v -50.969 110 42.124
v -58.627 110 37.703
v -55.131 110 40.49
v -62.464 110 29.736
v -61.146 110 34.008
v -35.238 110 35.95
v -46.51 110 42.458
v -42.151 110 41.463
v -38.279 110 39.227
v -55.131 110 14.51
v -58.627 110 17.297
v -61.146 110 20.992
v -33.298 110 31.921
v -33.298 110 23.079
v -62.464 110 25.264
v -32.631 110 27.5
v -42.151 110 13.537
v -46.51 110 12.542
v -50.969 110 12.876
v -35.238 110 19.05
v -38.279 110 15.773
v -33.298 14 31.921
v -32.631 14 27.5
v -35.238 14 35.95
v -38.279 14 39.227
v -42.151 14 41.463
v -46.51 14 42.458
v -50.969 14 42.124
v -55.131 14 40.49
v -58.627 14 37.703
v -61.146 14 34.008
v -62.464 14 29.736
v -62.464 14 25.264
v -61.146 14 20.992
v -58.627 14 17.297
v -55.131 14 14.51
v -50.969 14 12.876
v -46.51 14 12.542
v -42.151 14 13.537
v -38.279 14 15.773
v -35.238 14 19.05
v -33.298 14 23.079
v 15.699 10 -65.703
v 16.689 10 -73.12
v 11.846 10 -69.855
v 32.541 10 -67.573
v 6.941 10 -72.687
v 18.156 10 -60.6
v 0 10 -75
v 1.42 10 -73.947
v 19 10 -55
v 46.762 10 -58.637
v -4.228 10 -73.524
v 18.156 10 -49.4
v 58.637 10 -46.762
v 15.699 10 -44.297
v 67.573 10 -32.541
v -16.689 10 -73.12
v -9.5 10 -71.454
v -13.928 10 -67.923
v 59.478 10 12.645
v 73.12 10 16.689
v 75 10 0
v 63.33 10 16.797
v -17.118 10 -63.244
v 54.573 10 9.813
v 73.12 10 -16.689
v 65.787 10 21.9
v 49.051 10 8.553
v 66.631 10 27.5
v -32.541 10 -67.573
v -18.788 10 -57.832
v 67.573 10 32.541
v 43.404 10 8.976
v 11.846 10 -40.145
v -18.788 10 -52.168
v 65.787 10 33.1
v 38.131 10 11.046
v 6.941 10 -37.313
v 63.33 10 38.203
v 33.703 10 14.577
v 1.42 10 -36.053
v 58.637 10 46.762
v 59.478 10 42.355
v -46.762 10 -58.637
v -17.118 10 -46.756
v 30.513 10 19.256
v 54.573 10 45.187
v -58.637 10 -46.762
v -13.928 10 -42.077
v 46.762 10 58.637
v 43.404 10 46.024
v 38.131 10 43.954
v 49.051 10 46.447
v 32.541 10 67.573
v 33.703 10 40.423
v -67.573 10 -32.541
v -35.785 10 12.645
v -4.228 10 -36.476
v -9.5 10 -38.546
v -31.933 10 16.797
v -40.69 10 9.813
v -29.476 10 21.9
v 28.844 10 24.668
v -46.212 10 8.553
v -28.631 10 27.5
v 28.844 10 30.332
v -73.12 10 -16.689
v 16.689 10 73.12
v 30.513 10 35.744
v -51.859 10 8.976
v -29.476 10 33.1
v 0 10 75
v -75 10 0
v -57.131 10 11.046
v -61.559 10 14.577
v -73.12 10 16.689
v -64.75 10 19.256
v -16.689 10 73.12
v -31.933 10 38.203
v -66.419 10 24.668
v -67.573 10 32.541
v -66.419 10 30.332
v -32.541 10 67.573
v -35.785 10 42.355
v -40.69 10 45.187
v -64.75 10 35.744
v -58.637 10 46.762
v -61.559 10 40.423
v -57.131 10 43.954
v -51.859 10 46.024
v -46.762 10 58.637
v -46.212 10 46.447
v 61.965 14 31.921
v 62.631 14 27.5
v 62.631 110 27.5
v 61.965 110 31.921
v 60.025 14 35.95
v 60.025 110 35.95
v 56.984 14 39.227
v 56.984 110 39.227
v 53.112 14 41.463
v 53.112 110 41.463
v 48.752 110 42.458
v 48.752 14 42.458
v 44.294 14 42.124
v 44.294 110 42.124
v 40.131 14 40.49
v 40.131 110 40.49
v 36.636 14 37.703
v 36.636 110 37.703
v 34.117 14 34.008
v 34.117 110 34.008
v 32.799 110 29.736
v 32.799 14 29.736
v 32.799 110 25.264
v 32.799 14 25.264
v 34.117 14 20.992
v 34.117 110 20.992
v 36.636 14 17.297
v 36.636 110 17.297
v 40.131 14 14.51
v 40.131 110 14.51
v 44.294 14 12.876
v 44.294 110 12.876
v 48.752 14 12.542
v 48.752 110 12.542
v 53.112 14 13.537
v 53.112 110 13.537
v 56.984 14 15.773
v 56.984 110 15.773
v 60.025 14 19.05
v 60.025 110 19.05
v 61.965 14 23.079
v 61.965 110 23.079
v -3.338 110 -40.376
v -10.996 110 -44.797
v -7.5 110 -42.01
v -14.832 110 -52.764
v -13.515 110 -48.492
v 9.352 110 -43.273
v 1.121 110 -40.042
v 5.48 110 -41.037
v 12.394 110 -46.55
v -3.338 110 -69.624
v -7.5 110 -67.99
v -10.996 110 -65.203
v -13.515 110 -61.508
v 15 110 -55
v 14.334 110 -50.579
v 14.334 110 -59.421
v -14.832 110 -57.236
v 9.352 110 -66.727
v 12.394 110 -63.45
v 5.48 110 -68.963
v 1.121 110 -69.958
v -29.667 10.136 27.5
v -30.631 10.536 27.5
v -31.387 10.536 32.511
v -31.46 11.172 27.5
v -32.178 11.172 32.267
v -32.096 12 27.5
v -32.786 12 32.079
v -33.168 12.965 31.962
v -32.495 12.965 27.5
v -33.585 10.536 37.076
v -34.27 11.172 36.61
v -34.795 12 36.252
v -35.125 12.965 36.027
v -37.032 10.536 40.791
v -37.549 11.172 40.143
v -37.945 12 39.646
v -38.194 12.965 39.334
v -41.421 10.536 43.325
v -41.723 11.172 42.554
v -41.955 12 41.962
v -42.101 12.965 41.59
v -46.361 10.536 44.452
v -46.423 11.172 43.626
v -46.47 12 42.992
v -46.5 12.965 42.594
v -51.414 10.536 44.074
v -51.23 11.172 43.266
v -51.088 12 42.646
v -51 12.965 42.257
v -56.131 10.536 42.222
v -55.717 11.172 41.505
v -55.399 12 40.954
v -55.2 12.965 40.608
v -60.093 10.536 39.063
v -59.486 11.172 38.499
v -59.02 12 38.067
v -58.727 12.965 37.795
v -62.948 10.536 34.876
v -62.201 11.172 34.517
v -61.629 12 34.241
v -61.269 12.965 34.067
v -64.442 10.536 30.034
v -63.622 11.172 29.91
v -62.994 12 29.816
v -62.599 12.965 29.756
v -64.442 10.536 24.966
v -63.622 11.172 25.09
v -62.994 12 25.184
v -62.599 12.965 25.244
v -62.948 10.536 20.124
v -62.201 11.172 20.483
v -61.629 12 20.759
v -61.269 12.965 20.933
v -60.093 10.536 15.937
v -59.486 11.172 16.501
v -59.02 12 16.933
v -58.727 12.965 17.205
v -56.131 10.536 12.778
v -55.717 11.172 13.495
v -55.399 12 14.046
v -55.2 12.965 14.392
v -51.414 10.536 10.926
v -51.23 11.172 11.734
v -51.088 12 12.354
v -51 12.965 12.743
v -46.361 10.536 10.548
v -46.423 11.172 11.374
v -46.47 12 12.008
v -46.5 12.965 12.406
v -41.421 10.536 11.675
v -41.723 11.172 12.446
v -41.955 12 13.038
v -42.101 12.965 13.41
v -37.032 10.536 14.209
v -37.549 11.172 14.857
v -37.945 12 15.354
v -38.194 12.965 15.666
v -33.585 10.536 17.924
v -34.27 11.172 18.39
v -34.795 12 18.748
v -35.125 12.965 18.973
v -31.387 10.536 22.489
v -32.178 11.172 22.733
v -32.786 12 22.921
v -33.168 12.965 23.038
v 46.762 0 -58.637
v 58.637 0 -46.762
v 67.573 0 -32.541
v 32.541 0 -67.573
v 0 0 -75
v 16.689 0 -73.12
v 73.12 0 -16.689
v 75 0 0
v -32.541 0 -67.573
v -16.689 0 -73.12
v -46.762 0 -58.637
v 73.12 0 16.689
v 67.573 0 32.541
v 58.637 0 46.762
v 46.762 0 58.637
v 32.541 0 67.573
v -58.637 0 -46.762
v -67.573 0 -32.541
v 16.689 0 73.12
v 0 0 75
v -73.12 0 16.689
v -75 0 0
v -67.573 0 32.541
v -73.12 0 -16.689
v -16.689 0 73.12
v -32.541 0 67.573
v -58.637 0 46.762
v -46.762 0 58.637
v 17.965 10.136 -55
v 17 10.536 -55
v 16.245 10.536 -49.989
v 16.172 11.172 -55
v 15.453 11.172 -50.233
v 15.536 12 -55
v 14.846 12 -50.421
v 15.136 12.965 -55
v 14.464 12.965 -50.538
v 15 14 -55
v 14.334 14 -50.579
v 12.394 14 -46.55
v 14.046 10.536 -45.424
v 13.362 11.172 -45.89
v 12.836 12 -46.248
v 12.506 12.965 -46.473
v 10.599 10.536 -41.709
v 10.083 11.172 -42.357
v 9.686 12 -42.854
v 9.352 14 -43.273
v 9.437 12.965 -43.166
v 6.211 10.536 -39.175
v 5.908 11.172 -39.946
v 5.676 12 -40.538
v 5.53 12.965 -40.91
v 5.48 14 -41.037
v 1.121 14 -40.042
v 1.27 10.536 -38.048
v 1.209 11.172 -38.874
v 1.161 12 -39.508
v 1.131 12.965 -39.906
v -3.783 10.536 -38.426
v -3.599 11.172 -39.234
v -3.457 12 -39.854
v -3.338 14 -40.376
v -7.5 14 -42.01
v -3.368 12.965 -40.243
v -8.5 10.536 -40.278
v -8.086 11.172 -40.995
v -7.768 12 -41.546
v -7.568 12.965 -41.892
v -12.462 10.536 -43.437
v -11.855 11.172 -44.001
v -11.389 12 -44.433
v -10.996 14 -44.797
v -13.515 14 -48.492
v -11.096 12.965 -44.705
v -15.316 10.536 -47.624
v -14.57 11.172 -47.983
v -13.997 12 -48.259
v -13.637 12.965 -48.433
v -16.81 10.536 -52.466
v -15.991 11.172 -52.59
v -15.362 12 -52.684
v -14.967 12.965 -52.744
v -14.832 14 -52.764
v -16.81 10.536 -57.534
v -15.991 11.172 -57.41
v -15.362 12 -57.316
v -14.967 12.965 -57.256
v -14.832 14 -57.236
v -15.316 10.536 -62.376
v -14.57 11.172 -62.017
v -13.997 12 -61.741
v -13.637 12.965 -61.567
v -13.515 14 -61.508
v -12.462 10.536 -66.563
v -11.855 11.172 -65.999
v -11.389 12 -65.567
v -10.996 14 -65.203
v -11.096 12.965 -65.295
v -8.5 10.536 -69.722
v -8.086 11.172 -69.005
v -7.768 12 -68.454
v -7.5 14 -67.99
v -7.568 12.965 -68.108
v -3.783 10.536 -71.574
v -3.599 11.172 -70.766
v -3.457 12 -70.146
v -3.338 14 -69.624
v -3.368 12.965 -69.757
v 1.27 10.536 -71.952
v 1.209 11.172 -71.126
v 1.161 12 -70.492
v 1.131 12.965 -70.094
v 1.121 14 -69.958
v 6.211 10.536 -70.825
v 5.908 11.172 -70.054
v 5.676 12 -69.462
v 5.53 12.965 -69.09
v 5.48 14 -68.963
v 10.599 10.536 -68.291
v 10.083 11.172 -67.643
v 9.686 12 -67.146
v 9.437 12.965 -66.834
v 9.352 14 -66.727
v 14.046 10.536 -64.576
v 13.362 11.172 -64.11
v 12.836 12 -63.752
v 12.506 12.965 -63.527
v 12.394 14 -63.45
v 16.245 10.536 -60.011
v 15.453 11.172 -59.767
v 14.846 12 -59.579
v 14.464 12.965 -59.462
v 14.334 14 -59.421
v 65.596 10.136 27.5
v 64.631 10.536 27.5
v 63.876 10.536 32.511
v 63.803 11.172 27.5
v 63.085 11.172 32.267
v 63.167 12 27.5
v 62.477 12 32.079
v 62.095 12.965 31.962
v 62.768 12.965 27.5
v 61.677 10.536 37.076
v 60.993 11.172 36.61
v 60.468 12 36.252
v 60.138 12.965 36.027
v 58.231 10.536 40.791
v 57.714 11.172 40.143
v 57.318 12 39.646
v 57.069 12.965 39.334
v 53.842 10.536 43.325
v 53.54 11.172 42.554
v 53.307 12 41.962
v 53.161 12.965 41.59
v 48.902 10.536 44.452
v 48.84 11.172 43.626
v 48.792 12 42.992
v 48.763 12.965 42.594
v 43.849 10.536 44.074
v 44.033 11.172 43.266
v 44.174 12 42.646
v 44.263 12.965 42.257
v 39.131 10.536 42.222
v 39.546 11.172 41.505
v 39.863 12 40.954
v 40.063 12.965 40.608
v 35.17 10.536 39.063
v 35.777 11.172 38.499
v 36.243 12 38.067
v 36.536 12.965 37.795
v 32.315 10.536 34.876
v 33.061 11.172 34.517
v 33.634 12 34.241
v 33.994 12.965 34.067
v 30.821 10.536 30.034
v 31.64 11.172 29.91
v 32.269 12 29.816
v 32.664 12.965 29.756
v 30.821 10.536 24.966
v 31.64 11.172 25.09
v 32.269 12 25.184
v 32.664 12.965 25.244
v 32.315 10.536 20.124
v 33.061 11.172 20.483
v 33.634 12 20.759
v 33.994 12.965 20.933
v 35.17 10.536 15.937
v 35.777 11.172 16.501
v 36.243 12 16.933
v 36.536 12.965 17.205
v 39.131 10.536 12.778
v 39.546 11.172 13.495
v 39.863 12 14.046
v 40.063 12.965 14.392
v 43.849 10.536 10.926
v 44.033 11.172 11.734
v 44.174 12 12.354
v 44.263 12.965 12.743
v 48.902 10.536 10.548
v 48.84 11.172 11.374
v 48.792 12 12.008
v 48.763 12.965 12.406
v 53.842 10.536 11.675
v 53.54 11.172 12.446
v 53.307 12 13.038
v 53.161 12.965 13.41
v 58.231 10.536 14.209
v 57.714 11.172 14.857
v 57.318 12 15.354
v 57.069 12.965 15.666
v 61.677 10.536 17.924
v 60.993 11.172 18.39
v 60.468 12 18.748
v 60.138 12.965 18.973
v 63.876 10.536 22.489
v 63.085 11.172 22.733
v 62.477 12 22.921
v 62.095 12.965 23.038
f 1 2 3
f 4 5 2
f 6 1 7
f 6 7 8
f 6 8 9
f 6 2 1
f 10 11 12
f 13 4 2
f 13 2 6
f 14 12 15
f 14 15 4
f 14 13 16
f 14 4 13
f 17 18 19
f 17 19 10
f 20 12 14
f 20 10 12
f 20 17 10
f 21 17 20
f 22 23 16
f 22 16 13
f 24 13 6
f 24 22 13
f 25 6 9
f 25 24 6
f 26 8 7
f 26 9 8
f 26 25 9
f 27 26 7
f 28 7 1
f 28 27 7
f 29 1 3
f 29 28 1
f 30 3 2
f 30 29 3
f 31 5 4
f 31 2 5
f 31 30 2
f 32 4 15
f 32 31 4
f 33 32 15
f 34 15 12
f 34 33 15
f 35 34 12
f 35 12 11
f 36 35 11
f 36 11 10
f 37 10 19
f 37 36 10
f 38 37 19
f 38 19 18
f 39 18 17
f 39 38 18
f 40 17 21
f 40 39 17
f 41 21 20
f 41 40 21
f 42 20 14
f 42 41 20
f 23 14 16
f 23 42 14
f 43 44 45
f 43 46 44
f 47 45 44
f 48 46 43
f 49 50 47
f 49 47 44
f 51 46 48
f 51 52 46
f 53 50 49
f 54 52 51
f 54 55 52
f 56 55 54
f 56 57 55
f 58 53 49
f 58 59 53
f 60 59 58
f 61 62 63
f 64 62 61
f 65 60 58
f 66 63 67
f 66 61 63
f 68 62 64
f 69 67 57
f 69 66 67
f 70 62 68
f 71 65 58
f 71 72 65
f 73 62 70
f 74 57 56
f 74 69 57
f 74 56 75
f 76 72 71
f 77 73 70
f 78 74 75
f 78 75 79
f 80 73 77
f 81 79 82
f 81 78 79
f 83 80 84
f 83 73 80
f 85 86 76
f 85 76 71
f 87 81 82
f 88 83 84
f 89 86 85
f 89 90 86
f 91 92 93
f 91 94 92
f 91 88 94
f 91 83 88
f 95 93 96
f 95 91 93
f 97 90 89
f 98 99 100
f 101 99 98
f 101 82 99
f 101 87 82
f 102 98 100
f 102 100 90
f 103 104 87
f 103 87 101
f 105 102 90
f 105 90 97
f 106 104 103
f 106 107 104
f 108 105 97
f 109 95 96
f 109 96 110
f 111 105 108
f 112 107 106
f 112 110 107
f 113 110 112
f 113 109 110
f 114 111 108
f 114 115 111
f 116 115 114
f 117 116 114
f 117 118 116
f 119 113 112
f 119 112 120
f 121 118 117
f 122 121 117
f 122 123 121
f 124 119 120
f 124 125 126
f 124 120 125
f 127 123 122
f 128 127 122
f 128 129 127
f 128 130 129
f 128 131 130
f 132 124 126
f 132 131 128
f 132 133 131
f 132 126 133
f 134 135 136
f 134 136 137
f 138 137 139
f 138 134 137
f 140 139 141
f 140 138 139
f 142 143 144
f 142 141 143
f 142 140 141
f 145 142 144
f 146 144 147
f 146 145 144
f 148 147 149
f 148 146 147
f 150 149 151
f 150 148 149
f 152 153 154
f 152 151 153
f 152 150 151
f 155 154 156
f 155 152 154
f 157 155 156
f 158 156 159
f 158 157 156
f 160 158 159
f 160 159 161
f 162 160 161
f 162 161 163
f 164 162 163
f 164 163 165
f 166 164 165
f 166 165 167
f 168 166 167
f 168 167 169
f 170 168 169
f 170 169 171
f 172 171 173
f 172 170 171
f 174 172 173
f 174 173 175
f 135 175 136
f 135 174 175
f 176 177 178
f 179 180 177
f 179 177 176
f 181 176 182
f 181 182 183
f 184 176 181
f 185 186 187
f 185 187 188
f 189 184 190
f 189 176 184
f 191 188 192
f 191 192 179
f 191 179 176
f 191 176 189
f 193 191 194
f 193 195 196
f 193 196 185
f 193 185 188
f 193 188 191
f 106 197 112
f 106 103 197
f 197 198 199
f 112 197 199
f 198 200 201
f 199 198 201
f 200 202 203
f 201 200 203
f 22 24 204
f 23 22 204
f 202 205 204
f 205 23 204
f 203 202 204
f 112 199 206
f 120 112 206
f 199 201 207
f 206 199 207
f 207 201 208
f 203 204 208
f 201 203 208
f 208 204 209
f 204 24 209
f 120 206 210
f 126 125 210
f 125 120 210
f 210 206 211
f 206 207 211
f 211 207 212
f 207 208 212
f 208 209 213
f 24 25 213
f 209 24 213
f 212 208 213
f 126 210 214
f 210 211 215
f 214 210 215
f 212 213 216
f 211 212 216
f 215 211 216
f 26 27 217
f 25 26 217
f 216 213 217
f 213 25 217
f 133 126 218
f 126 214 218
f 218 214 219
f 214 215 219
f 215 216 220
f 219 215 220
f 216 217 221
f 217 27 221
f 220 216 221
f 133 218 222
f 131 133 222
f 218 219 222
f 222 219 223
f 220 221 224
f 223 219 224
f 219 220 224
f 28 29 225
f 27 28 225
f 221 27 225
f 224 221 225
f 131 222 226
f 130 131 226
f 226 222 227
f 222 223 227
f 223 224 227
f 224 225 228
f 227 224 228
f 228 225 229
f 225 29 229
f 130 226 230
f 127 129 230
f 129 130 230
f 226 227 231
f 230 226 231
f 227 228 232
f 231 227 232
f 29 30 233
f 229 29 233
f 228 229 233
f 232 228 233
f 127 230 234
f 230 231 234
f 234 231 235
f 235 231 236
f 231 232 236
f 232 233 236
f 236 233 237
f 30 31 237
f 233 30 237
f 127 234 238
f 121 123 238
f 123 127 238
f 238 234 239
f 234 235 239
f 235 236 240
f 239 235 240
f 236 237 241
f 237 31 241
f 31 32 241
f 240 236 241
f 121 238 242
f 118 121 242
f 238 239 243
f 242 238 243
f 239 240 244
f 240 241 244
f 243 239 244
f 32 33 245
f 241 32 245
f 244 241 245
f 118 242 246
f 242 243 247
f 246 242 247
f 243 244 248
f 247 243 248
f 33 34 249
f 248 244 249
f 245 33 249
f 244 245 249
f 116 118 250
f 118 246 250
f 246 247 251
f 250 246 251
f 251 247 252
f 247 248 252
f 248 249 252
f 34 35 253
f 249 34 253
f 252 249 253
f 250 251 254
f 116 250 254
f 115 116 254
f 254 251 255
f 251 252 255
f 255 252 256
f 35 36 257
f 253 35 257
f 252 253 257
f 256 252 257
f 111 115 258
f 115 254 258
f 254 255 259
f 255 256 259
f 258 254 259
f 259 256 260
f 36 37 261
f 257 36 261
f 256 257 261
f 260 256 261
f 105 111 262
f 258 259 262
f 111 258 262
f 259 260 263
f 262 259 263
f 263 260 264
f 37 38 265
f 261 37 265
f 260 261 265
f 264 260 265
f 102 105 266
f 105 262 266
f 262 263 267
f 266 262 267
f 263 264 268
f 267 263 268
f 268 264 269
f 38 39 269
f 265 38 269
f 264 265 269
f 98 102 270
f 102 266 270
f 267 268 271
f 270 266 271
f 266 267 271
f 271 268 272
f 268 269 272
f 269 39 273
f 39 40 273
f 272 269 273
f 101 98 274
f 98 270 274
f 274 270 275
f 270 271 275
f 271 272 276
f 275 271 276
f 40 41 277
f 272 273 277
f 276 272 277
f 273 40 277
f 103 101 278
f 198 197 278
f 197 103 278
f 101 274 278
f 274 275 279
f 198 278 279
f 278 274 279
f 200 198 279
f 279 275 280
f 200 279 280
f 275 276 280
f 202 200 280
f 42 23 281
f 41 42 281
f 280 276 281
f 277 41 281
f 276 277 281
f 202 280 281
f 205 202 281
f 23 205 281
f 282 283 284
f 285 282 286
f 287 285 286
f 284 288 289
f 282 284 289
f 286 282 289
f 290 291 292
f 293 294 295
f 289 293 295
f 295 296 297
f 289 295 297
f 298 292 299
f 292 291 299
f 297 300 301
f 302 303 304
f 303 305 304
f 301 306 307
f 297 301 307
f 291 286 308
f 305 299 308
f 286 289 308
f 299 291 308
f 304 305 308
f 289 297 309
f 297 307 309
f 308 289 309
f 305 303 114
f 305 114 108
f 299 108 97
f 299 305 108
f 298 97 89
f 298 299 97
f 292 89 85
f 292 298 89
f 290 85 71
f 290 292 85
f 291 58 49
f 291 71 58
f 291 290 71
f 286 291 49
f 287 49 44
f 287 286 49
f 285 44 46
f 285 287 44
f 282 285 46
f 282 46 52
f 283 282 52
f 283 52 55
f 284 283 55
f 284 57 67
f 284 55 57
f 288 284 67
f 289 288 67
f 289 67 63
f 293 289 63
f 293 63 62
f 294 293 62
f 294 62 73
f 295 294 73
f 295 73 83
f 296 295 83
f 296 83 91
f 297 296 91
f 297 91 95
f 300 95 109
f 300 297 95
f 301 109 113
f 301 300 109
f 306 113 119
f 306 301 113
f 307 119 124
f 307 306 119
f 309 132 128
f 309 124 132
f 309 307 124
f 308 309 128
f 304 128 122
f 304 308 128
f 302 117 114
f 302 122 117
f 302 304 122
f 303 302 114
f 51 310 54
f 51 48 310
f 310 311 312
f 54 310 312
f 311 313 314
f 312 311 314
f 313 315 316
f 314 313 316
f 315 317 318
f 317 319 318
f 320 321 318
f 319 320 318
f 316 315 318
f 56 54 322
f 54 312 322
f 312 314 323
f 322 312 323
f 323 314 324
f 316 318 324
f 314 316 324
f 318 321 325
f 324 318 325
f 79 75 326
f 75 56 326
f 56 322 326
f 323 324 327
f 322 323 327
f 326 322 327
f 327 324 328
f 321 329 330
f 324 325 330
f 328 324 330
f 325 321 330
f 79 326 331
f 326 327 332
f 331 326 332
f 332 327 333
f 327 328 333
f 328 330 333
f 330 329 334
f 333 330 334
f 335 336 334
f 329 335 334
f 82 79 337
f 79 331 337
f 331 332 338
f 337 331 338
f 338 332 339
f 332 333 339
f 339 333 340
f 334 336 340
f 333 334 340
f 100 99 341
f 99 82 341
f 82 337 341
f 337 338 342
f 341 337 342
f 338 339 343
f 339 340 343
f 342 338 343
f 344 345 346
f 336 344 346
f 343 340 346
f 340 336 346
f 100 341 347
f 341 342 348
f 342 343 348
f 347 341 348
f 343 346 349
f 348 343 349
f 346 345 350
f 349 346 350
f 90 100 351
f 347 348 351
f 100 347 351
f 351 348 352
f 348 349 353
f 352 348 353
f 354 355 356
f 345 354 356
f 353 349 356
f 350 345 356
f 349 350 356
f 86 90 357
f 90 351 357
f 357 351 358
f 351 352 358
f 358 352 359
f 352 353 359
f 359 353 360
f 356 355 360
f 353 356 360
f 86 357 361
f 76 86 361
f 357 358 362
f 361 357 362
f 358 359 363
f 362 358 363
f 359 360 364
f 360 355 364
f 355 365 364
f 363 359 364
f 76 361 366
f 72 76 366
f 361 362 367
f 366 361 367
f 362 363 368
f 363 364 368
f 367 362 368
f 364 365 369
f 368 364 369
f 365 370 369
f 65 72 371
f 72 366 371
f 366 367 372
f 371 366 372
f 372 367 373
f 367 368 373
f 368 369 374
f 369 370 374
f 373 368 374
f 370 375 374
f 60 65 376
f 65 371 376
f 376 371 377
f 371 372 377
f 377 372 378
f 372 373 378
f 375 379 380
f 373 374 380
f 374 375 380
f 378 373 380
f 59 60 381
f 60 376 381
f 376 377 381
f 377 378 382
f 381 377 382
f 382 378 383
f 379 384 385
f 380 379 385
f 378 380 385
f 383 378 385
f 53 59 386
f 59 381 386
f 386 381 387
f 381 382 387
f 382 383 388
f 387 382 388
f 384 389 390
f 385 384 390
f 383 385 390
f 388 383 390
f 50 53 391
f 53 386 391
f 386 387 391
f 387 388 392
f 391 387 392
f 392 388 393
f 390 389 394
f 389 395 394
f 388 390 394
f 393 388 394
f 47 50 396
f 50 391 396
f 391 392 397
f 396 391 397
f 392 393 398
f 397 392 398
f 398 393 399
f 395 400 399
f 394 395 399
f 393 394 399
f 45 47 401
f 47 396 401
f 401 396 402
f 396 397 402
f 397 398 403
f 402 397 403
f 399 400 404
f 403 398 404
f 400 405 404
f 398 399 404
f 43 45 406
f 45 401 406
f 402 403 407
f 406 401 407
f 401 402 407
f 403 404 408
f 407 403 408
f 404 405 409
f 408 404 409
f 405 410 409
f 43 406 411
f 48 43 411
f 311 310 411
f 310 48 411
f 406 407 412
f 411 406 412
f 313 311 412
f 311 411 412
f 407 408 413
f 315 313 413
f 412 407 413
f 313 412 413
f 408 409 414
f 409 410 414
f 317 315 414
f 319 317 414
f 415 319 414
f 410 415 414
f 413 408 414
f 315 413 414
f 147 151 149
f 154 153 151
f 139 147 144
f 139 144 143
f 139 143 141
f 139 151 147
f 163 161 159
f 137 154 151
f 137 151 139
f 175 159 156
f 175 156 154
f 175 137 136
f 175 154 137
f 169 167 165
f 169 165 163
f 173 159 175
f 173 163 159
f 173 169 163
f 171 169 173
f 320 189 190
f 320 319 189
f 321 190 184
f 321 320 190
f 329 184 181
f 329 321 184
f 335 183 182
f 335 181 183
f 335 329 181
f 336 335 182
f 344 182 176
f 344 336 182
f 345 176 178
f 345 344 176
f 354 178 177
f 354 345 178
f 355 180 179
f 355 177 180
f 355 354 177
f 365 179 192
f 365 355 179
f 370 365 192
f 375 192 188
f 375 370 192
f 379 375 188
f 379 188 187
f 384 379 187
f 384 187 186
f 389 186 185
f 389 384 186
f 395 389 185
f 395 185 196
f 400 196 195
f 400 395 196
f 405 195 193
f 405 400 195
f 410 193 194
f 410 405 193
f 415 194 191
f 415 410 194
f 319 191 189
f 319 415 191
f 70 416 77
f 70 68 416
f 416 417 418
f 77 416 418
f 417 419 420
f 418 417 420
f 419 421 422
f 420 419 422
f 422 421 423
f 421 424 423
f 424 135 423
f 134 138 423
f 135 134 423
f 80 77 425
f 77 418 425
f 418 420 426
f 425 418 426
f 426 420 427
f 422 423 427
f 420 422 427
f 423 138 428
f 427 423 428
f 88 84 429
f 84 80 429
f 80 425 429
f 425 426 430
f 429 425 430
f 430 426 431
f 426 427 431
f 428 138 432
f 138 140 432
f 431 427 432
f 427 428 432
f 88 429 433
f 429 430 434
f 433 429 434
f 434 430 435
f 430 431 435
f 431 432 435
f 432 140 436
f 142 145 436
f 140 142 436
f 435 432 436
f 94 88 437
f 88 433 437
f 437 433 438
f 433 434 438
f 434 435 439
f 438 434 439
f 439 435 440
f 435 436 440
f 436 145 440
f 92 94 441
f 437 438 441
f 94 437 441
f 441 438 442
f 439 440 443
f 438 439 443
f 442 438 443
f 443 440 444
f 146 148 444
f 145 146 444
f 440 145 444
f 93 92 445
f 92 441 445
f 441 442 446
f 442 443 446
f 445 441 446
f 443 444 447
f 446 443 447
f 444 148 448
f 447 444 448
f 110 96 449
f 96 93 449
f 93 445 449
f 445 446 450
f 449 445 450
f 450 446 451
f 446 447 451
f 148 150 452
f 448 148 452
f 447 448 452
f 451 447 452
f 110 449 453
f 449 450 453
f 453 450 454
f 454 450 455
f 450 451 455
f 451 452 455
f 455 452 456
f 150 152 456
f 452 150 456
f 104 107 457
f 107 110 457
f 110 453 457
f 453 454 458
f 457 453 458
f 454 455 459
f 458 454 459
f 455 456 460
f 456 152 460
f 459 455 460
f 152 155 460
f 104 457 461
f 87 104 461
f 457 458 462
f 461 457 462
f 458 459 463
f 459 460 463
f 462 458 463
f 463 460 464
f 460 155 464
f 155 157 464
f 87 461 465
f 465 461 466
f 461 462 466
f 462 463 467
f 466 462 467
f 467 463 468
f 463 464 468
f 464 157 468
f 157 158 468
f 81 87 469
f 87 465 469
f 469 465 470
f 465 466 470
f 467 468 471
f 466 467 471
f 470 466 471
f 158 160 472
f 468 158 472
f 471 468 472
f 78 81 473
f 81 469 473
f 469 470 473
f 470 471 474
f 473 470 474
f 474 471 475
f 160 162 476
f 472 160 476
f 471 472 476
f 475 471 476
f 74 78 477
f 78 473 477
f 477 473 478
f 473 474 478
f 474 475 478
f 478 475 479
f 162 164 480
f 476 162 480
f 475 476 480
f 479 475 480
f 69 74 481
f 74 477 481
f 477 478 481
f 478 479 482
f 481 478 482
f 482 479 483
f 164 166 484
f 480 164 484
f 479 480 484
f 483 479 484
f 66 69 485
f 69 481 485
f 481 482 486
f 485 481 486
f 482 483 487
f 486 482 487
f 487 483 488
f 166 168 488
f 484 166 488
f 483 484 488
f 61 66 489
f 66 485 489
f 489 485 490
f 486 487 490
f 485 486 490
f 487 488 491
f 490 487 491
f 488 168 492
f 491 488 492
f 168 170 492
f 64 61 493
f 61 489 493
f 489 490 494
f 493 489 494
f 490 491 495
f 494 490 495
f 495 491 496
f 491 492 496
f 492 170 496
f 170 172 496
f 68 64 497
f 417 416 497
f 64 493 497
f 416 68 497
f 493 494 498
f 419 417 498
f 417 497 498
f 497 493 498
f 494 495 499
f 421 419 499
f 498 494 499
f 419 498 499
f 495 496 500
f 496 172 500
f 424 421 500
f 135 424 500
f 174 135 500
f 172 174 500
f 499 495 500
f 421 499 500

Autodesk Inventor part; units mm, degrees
ref_plane "YZ Plane" through (0, 0, 0) normal (1, 0, 0) x (0, 1, 0)
ref_plane "XZ Plane" through (0, 0, 0) normal (0, 1, 0) x (-1, 0, 0)
ref_plane "XY Plane" through (0, 0, 0) normal (0, 0, 1) x (1, 0, 0)
sketch "スケッチ1" plane through (0, 0, 0) normal (0, 1, 0) x (-1, 0, 0)
  circle A0 centre (0, 0) radius 75
  dimension "d0" = 150
extrude "押し出し1" add sketch "スケッチ1" along normal blind 10
sketch "スケッチ2" plane through (0, 10, 0) normal (0, 1, 0) x (1, 0, 0)
  circle A0 centre (0, 55) radius 15
  circle A1 centre (-47.6314, -27.5) radius 15
  circle A2 centre (47.6314, -27.5) radius 15
  point P0 (0, 0)
  dimension "d3" = 30
  dimension "d4" = 55
  dimension "d7" = 360
extrude "押し出し2" add sketch "スケッチ2" along normal blind 100
fillet "フィレット1" radius 4 3 edges at (-62.6314, 10, 27.5) (32.6314, 10, 27.5) (-15, 10, -55)
